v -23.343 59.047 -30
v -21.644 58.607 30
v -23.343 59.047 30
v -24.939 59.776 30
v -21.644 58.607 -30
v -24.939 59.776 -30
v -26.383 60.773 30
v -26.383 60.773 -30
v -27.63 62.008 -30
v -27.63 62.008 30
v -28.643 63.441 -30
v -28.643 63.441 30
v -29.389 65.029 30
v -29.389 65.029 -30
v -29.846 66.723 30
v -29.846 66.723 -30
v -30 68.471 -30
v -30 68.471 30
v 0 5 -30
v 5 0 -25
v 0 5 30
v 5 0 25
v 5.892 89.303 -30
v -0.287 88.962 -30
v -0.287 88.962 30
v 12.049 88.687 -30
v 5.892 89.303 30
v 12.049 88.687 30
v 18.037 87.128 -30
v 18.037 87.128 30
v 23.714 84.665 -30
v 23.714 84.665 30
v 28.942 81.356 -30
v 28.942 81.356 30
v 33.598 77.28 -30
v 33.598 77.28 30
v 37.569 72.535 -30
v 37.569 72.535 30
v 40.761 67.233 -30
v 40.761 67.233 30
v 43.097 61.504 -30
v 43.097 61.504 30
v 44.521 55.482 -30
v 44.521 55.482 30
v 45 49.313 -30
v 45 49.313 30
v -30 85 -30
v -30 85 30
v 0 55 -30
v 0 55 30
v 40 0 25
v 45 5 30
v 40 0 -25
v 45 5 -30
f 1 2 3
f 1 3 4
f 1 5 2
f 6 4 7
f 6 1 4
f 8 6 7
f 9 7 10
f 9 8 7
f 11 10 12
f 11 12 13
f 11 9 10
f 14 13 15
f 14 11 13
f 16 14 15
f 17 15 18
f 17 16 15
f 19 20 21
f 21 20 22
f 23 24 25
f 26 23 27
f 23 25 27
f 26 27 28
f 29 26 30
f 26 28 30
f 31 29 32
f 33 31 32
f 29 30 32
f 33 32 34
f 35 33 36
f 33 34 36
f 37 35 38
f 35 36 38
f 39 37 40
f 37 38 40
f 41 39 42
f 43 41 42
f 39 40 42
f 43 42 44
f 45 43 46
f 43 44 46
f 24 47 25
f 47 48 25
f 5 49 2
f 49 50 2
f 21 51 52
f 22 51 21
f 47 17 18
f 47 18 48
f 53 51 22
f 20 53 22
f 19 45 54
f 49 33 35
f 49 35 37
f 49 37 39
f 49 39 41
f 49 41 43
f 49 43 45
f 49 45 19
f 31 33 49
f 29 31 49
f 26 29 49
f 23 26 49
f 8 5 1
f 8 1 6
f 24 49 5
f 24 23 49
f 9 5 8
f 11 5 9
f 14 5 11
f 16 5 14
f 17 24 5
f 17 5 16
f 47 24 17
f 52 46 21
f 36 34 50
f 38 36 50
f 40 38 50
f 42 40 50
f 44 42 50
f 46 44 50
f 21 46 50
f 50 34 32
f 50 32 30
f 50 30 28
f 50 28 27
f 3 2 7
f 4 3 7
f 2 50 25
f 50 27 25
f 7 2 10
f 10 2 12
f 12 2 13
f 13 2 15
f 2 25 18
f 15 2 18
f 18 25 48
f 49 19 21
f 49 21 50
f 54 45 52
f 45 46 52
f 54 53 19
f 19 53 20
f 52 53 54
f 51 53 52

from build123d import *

# Parameters (mm, degrees)
EXTRUDE_1_DEPTH = 30
CHAMFER_1_SIZE  = 5
FILLET_1_R      = 10


with BuildPart() as part:
    # 草图1 → 凸台-拉伸1 (new, symmetric)
    with BuildSketch(Plane.XY):
        with BuildLine():
            Line((0, 0), (0, 55))
            Line((0, 55), (-30, 60))
            Line((-30, 60), (-30, 85))
            Line((-30, 85), (-0.286548804, 88.961793493))
            ThreePointArc((-0.286548804, 88.961793493), (31.348985254, 79.40804216), (45, 49.312677466))
            Line((45, 49.312677466), (45, 0))
            Line((45, 0), (0, 0))
        make_face()
    extrude(amount=EXTRUDE_1_DEPTH, both=True)

    # 倒角1
    chamfer_1_edges = [part.edges().sort_by_distance(p)[0] for p in [
        (0, 0, 0),
        (45, 0, 0),
        (22.5, 0, 30),
        (22.5, 0, -30),
    ]]
    chamfer(chamfer_1_edges, length=CHAMFER_1_SIZE)

    # 圆角1
    fillet_1_edges = [part.edges().sort_by_distance(p)[0] for p in [
        (-30, 60, 0),
    ]]
    fillet(fillet_1_edges, radius=FILLET_1_R)


solid = part.part
